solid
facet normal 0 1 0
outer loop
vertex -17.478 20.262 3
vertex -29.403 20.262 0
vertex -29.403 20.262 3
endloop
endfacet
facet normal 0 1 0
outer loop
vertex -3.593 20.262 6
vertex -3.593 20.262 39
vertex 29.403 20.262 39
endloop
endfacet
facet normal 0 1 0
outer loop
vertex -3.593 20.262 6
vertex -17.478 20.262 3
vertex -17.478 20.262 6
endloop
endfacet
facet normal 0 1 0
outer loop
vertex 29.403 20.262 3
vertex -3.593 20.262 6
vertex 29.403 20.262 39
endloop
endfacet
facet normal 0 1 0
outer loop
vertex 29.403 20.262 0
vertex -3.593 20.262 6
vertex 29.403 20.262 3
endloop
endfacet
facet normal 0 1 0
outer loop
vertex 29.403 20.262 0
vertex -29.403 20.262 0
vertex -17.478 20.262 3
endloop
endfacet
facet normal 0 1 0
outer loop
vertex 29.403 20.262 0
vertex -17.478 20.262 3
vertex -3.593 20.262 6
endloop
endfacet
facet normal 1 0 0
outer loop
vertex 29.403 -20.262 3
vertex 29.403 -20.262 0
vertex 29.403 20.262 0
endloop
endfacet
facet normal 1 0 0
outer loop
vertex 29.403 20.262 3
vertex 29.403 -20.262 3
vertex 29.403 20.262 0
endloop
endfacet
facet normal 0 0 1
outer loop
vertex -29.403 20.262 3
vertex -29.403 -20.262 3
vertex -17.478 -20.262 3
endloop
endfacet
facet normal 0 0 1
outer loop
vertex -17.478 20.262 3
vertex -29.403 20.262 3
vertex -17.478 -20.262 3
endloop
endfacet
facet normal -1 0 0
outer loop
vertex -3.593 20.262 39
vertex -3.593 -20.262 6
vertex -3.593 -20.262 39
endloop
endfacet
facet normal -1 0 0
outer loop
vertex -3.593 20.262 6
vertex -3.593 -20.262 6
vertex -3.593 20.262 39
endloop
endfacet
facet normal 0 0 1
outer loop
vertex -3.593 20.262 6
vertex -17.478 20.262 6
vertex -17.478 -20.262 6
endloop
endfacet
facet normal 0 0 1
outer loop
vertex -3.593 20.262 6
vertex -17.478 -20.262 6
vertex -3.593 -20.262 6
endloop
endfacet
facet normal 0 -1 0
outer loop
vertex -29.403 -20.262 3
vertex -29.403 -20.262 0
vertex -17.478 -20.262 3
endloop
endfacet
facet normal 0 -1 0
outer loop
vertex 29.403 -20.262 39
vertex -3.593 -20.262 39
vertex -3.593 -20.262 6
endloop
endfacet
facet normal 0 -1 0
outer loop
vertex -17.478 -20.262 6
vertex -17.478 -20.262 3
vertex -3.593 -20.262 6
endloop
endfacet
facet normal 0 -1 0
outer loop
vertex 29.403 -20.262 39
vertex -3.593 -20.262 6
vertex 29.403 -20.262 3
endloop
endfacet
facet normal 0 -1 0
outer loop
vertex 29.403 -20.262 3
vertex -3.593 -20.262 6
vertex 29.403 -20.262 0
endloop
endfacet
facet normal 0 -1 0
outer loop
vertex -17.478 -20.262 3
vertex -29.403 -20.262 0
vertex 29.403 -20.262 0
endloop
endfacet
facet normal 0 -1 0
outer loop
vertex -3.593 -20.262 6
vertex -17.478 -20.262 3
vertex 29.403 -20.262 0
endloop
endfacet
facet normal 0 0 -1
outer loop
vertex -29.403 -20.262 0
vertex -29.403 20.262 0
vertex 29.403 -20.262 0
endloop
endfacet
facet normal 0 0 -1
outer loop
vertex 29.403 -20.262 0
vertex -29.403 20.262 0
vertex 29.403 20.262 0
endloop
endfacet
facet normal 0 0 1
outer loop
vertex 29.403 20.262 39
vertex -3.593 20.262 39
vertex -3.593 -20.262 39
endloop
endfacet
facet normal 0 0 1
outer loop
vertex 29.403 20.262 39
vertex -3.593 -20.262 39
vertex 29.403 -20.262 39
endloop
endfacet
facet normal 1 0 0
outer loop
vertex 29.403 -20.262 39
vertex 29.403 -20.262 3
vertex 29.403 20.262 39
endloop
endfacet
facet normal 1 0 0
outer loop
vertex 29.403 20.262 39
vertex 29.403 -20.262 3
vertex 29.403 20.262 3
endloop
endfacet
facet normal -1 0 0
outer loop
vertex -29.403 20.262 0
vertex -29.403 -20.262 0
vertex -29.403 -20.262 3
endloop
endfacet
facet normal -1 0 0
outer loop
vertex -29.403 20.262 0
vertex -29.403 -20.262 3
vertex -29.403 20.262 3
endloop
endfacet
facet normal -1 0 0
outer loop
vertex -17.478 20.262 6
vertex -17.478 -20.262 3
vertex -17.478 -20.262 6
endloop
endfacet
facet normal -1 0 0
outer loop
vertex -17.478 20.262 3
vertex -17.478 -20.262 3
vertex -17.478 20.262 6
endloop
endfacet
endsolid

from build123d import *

# Parameters (mm, degrees)
F0_W     = 58.805938
F0_H     = 40.52332
F1_DEPTH = 3
F2_W     = 46.881379
F2_H     = 40.52332
F3_DEPTH = 3
F4_W     = 32.996017
F4_H     = 40.52332
F5_DEPTH = 3
F6_W     = 32.996017
F6_H     = 40.52332
F7_DEPTH = 30


with BuildPart() as f1:
    # F0 (on Top) → F1 (new body)
    with BuildSketch(Plane.XY):
        Rectangle(F0_W, F0_H)
    extrude(amount=F1_DEPTH)

    # F2 (on face) → F3 (join)
    with BuildSketch(Plane.XY.offset(3)):
        with Locations((5.962279, 0)):
            Rectangle(F2_W, F2_H)
    extrude(amount=F3_DEPTH)

    # F4 (on face) → F5 (join)
    with BuildSketch(Plane.XY.offset(6)):
        with Locations((12.90496, 0)):
            Rectangle(F4_W, F4_H)
    extrude(amount=F5_DEPTH)

    # F6 (on face) → F7 (join)
    with BuildSketch(Plane.XY.offset(9)):
        with Locations((12.90496, 0)):
            Rectangle(F6_W, F6_H)
    extrude(amount=F7_DEPTH)


solid = f1.part
